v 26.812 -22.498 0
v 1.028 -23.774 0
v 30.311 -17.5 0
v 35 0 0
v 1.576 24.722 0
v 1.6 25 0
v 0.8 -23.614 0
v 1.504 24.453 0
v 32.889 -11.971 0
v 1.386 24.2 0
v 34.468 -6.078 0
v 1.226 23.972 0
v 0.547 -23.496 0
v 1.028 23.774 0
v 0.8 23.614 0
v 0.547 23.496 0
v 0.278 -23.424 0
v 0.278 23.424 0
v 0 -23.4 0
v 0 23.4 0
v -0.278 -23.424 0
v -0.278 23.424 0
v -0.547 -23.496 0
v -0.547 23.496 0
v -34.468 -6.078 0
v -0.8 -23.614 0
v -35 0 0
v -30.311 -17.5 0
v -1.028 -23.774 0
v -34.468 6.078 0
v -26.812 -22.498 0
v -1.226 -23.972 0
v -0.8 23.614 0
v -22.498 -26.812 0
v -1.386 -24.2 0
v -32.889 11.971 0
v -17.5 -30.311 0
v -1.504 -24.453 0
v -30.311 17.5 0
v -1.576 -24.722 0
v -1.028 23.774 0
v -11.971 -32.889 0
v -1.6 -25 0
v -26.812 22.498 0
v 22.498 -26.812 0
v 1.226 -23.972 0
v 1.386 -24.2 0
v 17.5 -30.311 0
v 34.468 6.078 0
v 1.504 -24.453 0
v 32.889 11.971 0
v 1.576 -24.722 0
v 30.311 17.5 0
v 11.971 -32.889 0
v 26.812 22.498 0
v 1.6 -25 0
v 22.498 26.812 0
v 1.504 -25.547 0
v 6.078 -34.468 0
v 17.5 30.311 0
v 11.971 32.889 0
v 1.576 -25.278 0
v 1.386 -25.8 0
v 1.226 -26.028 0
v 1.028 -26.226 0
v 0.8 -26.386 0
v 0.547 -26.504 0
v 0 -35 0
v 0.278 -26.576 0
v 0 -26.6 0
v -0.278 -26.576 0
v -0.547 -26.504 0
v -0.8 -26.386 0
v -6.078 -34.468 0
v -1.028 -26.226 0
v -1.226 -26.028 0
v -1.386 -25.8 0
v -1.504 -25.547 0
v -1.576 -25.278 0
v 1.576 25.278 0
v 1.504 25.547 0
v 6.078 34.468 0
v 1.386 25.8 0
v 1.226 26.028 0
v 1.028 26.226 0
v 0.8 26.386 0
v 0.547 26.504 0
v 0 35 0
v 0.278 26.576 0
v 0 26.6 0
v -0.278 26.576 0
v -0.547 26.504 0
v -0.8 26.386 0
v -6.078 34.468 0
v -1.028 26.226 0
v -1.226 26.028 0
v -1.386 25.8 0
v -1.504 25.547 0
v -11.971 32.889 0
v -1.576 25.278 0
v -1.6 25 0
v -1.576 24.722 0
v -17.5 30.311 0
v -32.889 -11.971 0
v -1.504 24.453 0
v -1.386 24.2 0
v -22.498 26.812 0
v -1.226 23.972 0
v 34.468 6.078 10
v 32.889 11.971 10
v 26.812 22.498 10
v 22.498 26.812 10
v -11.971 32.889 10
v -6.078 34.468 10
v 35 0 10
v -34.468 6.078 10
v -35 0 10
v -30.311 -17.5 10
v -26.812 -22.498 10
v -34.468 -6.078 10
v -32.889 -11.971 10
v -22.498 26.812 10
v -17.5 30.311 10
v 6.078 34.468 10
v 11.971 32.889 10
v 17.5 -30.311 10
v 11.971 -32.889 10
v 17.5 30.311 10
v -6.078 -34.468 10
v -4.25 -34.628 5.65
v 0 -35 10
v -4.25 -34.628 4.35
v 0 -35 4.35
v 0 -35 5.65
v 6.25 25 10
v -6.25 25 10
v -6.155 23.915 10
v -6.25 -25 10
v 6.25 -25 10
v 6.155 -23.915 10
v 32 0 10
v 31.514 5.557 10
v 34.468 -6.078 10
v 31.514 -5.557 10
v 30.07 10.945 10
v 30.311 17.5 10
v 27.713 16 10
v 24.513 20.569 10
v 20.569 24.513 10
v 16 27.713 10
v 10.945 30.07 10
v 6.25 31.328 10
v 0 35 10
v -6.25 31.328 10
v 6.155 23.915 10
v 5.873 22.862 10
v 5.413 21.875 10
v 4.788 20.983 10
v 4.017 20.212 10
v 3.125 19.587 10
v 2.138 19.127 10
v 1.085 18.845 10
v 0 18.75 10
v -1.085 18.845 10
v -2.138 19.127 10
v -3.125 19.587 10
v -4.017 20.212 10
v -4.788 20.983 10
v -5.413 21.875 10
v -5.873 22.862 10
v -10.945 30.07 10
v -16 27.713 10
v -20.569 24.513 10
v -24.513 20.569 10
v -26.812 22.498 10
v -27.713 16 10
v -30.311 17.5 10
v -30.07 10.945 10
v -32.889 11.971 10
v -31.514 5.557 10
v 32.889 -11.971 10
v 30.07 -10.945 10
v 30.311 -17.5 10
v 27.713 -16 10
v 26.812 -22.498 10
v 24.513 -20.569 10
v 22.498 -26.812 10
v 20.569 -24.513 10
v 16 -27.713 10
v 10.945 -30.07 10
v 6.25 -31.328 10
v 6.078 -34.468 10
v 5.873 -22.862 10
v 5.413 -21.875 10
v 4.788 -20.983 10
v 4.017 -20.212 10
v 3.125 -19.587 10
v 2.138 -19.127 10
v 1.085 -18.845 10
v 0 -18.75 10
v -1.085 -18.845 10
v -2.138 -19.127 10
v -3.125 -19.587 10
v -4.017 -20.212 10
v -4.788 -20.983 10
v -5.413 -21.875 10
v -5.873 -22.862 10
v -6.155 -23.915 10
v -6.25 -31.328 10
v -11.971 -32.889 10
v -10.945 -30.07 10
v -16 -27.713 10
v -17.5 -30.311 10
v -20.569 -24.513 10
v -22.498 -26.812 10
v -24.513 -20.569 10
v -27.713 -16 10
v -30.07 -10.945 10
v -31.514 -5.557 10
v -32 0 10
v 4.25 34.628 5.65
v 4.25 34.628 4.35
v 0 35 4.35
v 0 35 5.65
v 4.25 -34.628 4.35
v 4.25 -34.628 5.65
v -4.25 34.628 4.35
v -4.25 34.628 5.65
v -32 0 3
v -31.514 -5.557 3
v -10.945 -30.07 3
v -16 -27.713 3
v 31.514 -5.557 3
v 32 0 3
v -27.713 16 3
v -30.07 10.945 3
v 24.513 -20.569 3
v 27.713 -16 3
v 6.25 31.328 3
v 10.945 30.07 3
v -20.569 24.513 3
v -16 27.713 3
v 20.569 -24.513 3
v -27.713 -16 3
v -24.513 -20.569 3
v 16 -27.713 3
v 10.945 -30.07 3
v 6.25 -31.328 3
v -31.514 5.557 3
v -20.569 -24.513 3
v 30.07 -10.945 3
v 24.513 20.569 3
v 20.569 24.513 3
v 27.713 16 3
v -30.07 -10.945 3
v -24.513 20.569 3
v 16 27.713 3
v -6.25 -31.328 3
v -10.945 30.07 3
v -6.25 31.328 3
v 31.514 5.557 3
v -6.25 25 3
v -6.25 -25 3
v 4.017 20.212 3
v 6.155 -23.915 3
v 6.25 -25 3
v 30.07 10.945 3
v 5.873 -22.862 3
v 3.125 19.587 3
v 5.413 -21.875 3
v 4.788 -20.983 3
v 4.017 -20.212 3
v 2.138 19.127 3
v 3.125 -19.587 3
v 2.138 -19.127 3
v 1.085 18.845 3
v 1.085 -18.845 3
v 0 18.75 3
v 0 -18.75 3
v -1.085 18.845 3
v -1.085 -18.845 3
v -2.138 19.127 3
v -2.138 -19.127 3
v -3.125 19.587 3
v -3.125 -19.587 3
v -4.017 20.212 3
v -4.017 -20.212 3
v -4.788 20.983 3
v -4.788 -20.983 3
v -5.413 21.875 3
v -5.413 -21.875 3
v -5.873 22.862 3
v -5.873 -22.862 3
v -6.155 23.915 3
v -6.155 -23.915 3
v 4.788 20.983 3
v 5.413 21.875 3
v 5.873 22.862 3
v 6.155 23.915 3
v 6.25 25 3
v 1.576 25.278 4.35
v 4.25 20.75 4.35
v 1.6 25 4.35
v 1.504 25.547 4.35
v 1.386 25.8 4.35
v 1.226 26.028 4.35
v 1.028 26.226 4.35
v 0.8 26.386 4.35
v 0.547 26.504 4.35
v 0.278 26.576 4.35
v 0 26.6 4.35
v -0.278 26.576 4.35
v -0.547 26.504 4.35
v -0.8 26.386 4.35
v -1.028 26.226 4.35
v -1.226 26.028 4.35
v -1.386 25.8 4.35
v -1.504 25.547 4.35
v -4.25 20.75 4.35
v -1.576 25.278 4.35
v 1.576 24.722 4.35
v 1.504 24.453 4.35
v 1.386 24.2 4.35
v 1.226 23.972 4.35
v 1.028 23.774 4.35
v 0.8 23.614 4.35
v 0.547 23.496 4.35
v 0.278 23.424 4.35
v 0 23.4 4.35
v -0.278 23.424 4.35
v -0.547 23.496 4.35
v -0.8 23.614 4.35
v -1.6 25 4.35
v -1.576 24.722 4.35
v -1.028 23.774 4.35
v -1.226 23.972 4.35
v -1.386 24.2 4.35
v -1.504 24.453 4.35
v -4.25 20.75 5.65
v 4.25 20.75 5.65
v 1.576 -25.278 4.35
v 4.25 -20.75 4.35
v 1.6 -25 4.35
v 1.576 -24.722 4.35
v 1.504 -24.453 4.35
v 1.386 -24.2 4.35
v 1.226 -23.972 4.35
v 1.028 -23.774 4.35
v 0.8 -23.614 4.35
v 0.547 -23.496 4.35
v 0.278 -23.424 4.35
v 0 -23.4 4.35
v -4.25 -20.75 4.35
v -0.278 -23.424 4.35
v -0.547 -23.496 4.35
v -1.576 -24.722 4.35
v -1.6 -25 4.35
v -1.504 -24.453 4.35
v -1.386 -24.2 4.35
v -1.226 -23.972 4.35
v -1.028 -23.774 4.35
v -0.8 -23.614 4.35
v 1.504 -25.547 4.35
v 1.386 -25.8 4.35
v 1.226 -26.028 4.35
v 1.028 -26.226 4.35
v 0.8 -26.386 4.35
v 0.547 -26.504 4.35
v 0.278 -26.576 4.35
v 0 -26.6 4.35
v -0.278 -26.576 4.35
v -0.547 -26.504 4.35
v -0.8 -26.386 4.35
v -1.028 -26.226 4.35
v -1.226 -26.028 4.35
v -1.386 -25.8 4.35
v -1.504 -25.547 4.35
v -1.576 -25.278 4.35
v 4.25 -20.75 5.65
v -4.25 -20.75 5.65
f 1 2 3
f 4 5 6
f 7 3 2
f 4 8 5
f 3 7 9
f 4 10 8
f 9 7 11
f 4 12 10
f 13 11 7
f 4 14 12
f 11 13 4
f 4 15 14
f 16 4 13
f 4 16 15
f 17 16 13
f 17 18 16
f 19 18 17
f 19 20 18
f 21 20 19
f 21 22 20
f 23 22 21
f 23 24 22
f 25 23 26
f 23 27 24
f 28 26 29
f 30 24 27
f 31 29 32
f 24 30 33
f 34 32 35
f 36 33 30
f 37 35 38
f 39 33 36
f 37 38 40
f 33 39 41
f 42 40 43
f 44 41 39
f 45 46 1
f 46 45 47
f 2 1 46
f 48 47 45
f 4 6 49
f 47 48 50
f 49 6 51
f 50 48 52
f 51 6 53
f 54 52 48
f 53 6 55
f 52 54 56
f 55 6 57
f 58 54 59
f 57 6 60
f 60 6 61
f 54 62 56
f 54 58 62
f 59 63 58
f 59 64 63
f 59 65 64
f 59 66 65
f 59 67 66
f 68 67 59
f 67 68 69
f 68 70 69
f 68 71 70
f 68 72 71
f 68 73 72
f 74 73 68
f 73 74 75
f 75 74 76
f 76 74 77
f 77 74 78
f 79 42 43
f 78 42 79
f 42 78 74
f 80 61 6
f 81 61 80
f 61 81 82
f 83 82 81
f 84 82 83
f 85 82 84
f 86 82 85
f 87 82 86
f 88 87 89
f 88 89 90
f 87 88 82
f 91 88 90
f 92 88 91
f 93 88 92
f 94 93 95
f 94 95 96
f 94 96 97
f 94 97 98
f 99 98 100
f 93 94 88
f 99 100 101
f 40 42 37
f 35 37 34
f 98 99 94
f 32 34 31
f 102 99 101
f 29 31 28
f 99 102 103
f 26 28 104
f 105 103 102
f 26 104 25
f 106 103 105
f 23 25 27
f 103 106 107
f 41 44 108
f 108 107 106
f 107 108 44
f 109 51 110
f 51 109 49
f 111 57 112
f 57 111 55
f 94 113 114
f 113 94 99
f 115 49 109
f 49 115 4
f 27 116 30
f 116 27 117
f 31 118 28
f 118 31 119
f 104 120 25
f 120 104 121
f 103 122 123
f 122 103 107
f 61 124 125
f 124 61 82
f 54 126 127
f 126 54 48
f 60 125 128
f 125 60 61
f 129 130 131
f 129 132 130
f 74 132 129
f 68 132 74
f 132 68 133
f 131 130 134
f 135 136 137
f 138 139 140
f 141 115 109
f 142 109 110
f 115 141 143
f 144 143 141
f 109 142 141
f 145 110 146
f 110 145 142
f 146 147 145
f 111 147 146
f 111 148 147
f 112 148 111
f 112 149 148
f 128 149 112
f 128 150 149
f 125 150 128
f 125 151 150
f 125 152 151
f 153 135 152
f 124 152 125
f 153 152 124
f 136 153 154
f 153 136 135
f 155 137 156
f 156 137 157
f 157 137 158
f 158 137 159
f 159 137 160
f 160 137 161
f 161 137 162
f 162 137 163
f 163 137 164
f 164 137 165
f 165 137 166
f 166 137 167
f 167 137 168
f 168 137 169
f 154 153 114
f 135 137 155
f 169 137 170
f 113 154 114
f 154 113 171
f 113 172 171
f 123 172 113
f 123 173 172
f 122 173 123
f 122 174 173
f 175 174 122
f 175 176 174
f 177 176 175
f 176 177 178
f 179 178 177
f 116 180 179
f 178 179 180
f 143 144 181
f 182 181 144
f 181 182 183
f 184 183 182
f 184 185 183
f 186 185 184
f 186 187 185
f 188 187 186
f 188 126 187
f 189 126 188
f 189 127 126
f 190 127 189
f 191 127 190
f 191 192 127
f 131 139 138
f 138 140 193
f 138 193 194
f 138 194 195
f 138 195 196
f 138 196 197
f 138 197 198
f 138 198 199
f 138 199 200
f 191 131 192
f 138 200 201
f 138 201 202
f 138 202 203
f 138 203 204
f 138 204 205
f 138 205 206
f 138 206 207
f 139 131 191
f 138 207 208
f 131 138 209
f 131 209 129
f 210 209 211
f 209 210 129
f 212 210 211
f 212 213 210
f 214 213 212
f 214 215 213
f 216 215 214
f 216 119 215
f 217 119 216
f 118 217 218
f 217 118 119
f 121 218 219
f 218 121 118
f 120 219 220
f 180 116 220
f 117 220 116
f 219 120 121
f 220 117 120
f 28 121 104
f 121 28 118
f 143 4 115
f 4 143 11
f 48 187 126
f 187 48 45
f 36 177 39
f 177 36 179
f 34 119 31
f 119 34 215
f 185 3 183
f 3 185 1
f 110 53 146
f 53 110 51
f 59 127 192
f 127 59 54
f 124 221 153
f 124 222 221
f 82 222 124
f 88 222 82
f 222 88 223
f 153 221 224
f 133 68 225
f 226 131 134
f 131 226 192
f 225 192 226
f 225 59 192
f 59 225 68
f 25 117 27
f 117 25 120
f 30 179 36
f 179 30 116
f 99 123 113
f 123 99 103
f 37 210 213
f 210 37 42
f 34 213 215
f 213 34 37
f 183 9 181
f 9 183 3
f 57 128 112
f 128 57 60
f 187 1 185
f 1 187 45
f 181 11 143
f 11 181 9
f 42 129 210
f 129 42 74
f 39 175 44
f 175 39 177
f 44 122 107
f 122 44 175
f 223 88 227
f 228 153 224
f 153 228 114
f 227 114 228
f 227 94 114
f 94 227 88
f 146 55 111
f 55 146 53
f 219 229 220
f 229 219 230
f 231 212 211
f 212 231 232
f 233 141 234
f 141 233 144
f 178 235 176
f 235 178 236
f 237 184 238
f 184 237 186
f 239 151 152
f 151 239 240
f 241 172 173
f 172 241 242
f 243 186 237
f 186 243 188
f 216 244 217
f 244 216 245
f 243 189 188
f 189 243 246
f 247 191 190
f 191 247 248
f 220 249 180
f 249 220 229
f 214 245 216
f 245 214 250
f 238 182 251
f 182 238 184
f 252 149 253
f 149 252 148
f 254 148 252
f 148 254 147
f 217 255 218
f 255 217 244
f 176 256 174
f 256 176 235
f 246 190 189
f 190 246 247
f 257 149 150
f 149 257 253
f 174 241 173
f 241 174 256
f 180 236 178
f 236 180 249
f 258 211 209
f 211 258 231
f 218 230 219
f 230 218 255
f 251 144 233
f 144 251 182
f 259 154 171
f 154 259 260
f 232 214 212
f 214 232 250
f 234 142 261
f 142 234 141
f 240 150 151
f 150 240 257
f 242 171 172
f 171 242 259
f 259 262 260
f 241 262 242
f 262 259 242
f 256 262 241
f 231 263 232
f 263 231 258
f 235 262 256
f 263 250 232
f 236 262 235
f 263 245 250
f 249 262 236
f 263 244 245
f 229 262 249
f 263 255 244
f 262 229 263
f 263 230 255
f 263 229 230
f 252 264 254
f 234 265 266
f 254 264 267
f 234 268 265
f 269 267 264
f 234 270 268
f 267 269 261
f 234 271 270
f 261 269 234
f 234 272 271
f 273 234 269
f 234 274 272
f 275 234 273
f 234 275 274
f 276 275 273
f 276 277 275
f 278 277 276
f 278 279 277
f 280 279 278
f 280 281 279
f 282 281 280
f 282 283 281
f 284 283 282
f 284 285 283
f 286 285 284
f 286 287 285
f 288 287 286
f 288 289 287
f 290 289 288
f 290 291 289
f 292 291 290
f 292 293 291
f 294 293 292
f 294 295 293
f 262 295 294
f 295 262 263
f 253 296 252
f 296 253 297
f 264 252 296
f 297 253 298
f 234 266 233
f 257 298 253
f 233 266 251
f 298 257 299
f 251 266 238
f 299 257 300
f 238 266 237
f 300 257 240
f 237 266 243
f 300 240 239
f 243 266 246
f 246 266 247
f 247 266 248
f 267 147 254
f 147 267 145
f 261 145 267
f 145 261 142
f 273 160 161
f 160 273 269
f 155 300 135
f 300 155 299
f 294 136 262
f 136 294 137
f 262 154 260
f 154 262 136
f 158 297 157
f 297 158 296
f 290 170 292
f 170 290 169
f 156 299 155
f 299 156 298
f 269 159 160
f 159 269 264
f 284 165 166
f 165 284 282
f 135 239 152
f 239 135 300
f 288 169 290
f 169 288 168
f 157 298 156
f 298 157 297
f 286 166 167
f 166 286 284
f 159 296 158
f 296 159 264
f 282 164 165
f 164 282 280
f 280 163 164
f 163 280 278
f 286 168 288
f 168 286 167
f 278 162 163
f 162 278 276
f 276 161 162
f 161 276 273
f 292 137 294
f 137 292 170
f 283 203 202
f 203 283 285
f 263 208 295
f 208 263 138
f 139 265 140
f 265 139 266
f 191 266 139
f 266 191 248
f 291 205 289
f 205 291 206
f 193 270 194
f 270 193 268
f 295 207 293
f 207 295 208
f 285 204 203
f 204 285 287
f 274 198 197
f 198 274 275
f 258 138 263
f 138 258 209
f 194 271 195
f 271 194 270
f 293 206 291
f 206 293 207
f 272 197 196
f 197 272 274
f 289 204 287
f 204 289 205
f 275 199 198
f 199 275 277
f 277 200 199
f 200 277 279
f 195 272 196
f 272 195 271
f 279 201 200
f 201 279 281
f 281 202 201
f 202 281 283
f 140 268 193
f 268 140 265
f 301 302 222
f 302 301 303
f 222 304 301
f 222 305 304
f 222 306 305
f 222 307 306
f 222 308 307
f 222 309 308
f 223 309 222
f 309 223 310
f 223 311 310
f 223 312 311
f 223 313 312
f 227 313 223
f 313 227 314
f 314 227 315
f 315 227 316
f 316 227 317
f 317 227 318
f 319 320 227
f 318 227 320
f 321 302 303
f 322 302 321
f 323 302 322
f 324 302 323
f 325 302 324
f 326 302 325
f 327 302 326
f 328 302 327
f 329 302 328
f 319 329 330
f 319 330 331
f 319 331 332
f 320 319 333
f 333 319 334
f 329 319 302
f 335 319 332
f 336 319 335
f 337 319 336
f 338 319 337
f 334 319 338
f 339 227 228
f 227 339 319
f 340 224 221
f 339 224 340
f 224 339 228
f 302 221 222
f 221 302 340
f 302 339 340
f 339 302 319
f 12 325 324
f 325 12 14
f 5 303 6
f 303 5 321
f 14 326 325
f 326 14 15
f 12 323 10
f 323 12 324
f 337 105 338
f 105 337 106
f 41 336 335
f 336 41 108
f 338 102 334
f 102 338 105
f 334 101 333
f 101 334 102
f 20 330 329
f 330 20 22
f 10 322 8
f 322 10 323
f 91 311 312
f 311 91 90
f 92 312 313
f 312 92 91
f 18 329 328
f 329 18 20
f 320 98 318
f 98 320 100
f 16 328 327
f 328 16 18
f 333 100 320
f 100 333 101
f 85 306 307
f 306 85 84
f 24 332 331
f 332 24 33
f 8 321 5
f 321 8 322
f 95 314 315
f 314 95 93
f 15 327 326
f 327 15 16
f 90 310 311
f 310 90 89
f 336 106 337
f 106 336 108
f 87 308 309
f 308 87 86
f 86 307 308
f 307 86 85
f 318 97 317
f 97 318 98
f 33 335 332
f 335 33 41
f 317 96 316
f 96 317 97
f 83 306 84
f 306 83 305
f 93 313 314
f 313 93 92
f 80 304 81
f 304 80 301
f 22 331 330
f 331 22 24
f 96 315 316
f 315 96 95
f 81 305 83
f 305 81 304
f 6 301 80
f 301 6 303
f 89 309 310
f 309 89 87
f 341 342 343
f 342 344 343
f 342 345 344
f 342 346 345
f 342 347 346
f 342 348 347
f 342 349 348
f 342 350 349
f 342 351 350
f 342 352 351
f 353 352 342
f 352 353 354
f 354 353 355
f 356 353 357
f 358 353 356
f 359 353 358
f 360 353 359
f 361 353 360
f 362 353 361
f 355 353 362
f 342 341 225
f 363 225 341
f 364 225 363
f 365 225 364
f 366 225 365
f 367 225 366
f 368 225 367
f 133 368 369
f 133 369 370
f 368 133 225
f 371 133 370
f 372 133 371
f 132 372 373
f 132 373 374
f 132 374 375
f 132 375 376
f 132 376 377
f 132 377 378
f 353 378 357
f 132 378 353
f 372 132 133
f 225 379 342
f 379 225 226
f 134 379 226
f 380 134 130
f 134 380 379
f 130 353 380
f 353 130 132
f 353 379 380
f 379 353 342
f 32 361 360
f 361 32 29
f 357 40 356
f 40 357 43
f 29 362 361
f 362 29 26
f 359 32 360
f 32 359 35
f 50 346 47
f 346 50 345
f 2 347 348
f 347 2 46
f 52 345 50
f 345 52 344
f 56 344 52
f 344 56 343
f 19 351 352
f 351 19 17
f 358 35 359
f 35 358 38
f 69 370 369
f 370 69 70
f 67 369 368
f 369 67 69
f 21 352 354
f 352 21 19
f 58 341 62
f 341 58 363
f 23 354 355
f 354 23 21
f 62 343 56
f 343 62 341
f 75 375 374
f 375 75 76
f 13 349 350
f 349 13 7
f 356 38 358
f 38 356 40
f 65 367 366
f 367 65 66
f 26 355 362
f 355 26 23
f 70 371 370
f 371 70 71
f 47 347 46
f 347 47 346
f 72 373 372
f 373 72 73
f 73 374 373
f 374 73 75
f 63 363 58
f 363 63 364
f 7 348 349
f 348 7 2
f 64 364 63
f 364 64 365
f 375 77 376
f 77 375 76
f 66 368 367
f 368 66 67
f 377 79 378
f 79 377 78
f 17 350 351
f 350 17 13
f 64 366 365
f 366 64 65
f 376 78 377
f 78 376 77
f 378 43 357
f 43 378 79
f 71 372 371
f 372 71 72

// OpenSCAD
/* [Render Parameters] */
$fa = 10;
$fs = 0.25;

/* [Light Settings] */
Light_Diameter = 70;

/* [Base Settings] */
Base_Depth = 10;
Base_Wall_Thickness = 3;
Base_Plate_Thickness = 3;

/* [Bolt Holes Settings] */
Bolt_Offset = 25;
Hole_Diameter = 3;
Width = 8.4;
Thickness = 1.2;
Bolt_Holder_Material_Thickness = 2;
Nut_Clearance = 0.1;
Bolt_Clearance = 0.2;

// Adjusting valves for Clearance
Bolt_Width = Width + Nut_Clearance;
Bolt_Thickness = Thickness + Nut_Clearance;
Bolt_Hole_Diameter = Hole_Diameter + Bolt_Clearance;

difference()
{
    union()
    {
        LightMounting();
        NutSupport();
    
        rotate([0,0,180])
        {
            NutSupport();    
        }
    }
    SquareNutHole();

    rotate([0,0,180])
    SquareNutHole();
}


module LightMounting()
{
    difference()
    {    
        Base();
        translate([0,0,Base_Plate_Thickness])
        {
            linear_extrude(Base_Depth - Base_Plate_Thickness)
            {
                circle(r = (Light_Diameter / 2) - Base_Wall_Thickness);
            }
        }
    }
}

module Base()
{
    linear_extrude(Base_Depth)
    {
        circle(r = Light_Diameter / 2);
    }
}

module SquareNutHole()
{
    translate([0,Bolt_Offset,0])
    {
        translate([-Bolt_Width / 2, -Bolt_Width / 2,(Base_Depth / 2) - (Bolt_Thickness / 2)])
        {
            #linear_extrude(Bolt_Thickness)
            {
                square([Bolt_Width, ((Light_Diameter/ 2) - Bolt_Offset) + (Bolt_Width / 2) ]);
            }
         }
        #linear_extrude((Base_Depth / 2))
        {
            circle(r = Bolt_Hole_Diameter / 2);
        }   
     }
}

module NutSupport()
{
    difference()
    {
        intersection()
        {
            Base();
            translate([0,Bolt_Offset,0])
            {
                linear_extrude(Base_Depth)
                {
                    radius = (Bolt_Width / 2) + Bolt_Holder_Material_Thickness;
                    circle(r = radius);
                    translate([-radius,0,0])
                    square([radius * 2, (Light_Diameter/ 2) - Bolt_Offset]);
                }
            }
        }
    }
}
